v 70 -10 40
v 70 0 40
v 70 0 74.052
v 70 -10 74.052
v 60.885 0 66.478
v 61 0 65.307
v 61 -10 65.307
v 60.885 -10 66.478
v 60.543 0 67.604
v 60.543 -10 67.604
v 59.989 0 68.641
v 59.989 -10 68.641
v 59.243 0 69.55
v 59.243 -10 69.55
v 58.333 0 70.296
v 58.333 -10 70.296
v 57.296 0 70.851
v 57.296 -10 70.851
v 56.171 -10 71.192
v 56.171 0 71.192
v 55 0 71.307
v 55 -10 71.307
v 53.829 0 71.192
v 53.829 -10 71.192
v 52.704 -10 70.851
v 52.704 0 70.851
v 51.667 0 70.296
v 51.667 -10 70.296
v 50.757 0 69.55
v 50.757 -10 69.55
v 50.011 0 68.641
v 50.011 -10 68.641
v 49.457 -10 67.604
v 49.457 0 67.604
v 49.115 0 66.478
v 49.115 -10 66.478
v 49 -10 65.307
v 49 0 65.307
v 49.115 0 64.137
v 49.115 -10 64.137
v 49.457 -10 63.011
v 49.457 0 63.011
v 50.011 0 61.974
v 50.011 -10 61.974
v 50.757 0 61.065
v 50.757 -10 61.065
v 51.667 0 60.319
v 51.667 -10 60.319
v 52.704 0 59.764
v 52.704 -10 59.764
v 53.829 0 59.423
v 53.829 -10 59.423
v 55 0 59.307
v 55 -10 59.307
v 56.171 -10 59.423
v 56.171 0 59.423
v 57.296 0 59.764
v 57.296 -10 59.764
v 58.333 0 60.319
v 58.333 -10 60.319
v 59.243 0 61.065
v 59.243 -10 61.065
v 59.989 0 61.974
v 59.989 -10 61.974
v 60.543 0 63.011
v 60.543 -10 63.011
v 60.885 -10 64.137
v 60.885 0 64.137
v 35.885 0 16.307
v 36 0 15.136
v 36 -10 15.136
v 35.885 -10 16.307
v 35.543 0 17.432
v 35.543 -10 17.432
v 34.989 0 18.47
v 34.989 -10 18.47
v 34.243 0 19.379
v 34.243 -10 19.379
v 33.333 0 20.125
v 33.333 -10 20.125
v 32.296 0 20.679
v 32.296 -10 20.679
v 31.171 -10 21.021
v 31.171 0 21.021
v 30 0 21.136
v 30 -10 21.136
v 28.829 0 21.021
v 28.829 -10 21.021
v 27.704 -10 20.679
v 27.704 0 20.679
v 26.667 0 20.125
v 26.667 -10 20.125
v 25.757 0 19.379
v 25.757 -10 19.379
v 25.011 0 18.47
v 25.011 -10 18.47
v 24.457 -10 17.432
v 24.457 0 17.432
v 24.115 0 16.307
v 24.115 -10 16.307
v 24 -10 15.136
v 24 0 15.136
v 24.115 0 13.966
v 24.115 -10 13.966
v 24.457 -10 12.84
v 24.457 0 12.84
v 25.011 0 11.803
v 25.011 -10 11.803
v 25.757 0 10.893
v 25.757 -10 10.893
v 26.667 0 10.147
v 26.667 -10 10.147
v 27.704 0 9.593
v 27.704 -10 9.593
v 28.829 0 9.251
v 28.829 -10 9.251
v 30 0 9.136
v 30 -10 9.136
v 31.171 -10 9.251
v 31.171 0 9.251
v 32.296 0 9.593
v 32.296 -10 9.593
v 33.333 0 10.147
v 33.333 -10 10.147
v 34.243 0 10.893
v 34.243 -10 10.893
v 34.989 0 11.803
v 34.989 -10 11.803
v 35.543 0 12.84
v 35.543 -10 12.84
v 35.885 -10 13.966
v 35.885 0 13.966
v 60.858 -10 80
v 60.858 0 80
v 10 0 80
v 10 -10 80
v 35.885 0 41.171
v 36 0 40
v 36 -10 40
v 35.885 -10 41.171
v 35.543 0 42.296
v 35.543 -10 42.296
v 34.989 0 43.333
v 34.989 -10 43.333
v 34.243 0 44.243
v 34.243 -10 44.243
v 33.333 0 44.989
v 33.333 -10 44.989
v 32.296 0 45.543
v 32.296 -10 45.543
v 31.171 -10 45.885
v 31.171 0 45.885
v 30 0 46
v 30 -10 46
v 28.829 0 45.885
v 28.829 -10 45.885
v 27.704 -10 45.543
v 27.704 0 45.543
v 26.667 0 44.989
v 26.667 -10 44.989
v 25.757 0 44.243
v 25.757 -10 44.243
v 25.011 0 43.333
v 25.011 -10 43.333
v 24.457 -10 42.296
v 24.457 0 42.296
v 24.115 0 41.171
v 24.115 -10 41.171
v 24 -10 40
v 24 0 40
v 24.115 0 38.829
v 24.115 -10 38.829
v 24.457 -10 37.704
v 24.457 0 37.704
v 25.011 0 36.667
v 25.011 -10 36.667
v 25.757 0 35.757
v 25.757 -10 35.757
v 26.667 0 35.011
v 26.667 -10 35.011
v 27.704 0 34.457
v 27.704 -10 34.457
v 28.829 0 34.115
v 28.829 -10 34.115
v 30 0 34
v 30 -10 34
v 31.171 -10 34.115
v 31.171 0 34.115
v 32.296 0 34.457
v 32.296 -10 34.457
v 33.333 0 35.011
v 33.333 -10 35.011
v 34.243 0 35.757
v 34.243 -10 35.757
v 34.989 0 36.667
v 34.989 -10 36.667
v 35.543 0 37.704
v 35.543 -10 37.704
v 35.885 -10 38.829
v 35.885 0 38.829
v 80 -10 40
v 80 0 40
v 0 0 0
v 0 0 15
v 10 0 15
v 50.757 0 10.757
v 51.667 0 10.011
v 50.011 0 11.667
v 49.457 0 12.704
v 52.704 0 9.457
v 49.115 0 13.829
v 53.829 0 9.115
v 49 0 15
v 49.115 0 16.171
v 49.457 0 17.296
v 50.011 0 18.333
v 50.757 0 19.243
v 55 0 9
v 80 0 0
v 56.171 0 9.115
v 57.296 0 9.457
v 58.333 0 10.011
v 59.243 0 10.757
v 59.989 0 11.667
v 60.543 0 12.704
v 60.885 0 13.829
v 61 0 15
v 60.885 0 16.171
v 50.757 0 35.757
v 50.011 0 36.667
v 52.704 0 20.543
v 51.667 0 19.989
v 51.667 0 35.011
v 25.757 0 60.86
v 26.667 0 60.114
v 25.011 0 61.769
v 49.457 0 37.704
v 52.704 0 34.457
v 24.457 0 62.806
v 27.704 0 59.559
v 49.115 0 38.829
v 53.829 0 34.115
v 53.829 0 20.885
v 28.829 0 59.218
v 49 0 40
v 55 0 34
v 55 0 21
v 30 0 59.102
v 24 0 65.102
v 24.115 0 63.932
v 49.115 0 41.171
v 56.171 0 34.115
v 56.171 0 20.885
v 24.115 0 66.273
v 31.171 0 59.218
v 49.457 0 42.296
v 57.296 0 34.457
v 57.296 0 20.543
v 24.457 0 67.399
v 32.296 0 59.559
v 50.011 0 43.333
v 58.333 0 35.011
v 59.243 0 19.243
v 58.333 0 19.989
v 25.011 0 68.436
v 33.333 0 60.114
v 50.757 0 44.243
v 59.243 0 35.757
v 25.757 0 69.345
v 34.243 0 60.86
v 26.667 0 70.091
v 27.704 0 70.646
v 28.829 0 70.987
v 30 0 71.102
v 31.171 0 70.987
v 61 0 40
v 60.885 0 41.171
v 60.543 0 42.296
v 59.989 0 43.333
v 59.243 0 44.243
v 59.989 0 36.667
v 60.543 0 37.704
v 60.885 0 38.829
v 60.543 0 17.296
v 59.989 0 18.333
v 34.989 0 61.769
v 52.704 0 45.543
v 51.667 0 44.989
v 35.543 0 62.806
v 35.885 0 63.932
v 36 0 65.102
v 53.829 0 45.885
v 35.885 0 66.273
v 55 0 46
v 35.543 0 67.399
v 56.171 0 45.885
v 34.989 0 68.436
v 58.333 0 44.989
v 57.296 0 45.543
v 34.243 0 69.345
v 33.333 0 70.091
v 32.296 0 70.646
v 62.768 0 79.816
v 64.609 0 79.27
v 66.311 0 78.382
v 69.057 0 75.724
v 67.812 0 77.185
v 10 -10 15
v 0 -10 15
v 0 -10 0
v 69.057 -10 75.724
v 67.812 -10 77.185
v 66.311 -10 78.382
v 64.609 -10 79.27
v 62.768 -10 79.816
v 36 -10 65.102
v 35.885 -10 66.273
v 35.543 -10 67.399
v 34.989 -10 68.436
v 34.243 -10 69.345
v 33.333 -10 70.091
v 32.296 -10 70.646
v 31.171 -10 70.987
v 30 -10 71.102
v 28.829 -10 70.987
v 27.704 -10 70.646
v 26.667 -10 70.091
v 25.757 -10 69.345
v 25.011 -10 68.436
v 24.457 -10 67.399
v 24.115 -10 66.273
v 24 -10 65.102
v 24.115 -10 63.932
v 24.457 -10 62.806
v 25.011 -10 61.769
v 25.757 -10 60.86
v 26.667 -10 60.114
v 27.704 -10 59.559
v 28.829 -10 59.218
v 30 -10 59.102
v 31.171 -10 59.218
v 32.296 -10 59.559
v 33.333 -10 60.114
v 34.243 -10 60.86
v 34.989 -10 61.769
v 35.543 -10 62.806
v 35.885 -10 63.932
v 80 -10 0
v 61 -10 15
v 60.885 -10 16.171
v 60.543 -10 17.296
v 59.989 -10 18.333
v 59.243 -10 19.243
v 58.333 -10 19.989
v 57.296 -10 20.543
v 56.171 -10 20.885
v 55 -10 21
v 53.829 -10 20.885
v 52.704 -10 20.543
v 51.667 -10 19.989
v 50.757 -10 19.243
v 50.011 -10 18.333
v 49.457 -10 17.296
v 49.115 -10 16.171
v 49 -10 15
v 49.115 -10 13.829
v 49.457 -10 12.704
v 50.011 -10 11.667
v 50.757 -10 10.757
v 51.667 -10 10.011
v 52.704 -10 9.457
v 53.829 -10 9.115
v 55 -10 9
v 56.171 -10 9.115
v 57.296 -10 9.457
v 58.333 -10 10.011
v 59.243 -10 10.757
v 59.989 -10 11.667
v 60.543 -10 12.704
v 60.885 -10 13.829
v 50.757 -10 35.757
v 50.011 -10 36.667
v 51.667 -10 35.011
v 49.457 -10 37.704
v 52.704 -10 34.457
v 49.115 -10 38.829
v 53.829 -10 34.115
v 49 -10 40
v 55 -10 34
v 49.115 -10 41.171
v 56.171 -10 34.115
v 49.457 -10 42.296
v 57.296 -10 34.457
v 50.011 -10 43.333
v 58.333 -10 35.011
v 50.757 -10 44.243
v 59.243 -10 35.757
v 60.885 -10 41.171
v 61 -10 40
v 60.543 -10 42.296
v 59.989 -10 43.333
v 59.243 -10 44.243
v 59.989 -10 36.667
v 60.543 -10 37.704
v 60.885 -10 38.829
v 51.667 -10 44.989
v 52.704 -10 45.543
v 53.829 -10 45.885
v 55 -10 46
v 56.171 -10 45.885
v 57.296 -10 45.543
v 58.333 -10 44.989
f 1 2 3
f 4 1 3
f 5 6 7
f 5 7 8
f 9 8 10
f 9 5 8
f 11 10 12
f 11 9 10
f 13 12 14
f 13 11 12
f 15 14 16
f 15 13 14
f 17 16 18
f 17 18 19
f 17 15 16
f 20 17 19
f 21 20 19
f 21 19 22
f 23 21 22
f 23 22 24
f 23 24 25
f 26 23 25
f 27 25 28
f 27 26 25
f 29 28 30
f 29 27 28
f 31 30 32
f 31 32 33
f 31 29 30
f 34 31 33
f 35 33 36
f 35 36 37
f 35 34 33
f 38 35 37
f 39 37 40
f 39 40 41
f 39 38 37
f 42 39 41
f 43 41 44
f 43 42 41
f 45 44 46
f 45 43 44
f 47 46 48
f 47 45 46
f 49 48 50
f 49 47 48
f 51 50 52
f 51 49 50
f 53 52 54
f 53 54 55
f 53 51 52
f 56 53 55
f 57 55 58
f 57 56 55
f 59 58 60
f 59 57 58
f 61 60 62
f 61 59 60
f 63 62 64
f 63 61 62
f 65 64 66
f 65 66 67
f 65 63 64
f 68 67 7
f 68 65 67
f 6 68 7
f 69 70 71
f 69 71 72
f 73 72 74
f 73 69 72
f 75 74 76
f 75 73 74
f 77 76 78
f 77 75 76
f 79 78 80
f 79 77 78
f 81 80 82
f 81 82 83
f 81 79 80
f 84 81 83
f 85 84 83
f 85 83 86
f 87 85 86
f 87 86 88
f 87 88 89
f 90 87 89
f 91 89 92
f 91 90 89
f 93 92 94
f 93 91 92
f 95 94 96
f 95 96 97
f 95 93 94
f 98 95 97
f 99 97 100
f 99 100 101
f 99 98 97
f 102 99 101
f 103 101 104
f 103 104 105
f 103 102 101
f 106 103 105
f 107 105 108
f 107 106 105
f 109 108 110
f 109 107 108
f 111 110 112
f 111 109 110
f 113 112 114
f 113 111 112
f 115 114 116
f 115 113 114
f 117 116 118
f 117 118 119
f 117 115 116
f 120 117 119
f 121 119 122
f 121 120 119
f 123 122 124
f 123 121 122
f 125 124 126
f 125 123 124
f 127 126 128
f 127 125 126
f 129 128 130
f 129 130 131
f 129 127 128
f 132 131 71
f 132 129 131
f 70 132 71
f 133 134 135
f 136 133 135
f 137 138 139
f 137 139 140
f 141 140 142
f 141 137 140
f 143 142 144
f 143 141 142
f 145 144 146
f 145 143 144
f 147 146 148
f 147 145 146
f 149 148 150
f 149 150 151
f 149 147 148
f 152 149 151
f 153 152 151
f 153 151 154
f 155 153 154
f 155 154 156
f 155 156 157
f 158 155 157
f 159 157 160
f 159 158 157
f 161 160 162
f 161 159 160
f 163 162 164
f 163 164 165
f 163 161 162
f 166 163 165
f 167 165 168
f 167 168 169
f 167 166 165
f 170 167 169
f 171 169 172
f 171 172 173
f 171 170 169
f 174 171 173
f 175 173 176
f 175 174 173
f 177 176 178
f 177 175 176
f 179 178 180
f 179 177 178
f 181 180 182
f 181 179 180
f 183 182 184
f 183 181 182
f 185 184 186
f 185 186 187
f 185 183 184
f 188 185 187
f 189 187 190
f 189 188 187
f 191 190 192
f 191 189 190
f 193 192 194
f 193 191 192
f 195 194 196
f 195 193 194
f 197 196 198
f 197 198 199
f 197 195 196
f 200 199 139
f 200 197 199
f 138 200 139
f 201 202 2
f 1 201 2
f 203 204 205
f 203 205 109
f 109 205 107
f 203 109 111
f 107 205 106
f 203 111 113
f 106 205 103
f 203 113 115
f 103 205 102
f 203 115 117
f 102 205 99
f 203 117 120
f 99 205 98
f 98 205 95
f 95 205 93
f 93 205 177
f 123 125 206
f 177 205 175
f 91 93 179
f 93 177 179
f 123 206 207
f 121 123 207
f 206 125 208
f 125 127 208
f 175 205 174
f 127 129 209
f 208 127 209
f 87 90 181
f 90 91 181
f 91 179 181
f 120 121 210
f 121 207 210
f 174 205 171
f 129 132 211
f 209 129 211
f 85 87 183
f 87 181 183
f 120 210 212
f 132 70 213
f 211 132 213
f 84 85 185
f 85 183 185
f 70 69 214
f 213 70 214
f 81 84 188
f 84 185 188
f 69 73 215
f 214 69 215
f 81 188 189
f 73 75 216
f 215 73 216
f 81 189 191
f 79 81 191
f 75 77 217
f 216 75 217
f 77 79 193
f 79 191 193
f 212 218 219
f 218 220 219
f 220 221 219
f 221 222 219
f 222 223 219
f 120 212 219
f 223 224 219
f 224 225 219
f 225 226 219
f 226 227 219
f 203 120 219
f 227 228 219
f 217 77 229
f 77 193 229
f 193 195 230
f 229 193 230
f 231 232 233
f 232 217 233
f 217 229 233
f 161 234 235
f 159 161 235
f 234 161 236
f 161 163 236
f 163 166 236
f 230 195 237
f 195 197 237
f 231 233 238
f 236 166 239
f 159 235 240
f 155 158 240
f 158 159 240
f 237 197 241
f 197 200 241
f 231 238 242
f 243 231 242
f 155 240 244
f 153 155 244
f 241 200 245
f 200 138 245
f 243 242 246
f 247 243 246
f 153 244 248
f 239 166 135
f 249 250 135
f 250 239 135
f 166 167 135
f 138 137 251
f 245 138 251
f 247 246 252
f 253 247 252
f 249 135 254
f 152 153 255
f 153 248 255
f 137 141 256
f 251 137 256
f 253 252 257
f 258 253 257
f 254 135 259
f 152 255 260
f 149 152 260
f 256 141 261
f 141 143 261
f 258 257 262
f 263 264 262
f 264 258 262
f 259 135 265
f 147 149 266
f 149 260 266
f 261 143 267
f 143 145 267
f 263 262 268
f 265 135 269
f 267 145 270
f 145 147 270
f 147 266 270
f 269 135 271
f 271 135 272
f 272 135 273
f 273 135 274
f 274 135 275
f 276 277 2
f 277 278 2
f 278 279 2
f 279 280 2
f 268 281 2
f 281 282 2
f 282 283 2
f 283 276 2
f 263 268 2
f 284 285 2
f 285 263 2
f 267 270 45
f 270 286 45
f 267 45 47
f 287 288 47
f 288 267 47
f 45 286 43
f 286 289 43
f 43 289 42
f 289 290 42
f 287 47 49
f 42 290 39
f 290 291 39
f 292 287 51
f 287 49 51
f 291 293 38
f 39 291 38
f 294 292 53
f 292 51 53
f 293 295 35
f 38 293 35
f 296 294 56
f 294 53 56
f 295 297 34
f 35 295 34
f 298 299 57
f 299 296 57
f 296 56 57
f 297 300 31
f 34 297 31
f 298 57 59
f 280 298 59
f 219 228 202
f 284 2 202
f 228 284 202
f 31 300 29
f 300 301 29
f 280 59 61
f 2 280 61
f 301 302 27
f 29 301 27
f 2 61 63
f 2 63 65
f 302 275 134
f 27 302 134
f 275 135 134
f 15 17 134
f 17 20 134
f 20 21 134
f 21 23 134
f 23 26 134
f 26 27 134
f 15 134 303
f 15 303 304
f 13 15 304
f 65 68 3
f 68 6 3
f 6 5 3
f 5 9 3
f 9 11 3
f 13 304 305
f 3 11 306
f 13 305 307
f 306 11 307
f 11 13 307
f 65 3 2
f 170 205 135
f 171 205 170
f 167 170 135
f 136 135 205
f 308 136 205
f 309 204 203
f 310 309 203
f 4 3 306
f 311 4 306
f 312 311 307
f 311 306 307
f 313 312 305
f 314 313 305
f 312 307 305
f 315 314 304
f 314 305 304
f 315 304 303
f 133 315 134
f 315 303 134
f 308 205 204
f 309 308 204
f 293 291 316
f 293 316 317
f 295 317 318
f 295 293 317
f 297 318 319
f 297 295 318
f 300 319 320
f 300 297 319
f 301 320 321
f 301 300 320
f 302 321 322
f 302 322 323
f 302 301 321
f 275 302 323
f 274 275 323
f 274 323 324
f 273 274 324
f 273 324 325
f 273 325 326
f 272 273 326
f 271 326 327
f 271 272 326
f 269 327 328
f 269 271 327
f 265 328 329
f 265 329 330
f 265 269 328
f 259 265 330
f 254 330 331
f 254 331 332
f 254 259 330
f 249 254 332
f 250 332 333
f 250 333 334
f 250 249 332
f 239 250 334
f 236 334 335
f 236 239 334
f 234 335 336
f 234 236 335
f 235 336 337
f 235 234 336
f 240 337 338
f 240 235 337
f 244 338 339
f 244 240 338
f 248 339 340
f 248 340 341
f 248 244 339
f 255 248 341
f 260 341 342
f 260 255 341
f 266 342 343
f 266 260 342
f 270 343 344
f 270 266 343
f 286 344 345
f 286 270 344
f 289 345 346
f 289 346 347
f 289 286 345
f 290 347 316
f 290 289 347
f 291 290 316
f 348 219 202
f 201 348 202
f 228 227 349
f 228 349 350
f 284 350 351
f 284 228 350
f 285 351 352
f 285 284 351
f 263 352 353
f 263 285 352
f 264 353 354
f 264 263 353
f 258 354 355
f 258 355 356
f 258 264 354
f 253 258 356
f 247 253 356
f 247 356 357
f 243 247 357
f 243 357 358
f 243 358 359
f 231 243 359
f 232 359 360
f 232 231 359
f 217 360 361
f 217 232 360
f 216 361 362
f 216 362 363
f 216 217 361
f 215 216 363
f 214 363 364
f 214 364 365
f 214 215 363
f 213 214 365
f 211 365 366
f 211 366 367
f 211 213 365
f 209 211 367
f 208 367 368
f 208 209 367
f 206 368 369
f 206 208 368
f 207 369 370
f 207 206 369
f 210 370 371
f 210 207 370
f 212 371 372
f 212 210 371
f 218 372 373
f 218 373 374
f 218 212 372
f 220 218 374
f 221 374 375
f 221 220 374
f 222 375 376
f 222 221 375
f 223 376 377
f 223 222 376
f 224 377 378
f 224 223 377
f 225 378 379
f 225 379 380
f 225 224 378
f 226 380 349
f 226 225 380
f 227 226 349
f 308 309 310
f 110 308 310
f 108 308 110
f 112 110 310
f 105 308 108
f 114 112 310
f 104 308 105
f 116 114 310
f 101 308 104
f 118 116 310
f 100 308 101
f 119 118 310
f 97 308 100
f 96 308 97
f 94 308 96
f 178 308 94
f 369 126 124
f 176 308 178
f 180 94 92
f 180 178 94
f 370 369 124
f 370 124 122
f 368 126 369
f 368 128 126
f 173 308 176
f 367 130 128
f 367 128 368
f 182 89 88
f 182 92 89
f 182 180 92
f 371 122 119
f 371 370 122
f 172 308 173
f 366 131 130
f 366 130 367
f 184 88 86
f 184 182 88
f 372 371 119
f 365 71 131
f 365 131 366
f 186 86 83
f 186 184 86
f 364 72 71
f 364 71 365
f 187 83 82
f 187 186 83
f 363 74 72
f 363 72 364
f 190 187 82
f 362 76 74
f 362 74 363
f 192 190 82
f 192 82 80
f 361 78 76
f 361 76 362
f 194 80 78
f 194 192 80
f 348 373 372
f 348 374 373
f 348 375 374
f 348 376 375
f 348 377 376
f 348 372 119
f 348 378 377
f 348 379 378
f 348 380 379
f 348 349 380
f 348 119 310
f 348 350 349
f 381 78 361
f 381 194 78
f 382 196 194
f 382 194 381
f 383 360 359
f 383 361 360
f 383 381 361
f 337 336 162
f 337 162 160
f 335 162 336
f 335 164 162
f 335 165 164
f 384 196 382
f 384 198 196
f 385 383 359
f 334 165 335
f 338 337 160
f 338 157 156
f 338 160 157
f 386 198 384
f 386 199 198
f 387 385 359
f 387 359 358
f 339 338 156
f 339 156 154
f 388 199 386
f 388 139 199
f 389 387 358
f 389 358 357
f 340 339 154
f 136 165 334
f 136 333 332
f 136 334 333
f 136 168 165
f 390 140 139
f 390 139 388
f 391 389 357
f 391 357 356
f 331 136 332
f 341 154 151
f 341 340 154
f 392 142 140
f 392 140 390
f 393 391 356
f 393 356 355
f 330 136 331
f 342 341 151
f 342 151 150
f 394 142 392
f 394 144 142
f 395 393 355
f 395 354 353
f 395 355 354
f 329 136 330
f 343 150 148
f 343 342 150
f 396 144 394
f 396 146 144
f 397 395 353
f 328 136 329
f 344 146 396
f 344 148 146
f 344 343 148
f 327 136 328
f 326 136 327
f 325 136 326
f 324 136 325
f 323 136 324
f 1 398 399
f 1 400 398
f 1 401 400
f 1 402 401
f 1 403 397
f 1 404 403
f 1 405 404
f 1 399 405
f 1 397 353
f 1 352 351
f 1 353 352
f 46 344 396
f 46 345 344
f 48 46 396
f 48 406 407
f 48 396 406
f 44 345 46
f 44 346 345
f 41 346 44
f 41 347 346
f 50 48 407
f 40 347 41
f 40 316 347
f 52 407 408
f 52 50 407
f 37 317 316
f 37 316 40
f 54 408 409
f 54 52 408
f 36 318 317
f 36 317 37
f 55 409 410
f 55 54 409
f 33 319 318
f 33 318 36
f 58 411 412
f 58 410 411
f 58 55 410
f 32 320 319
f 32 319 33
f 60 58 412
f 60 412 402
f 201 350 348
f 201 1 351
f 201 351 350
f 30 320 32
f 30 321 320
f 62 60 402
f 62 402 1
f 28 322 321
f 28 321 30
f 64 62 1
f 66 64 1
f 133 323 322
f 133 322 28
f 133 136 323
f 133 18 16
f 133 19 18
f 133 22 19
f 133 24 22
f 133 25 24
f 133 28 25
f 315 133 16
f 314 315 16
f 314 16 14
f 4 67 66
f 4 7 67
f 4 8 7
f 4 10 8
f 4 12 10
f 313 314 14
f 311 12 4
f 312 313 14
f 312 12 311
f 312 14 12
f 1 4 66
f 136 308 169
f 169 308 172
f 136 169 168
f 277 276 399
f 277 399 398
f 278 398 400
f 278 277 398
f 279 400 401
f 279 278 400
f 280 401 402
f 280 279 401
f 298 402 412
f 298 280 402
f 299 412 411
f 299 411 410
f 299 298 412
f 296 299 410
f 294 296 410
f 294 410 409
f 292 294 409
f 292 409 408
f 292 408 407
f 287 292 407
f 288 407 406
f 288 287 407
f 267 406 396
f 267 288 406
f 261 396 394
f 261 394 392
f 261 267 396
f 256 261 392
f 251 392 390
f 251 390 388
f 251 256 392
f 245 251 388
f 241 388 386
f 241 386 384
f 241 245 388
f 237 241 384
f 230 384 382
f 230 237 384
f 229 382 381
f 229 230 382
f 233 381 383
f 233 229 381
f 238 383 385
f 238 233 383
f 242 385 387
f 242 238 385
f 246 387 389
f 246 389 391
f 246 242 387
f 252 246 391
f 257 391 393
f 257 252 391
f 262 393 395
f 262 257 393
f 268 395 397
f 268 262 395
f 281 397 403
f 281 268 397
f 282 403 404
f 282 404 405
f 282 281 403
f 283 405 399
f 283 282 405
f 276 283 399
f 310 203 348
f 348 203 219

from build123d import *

# Parameters (mm, degrees)
F0_R     = 6
F1_DEPTH = 10


with BuildPart() as f1:
    # F0 (on Front) → F1 (new body)
    with BuildSketch(Plane.XZ):
        with BuildLine():
            Line((0, 15), (0, 0))
            Line((0, 0), (55, 0))
            Line((55, 0), (80, 0))
            Line((80, 0), (80, 40))
            Line((80, 40), (70, 40))
            Line((70, 40), (70, 74.051529))
            ThreePointArc((70, 74.051529), (66.311166, 78.381983), (60.857511, 80))
            Line((60.857511, 80), (10, 80))
            Line((10, 80), (10, 15))
            Line((10, 15), (0, 15))
        make_face()
        with Locations((30, 15.13609)):
            Circle(F0_R, mode=Mode.SUBTRACT)
        with Locations((55, 15)):
            Circle(F0_R, mode=Mode.SUBTRACT)
        with Locations((30, 40)):
            Circle(F0_R, mode=Mode.SUBTRACT)
        with Locations((30, 65.102487)):
            Circle(F0_R, mode=Mode.SUBTRACT)
        with Locations((55, 40)):
            Circle(F0_R, mode=Mode.SUBTRACT)
        with Locations((55, 65.307461)):
            Circle(F0_R, mode=Mode.SUBTRACT)
    extrude(amount=F1_DEPTH)


solid = f1.part
